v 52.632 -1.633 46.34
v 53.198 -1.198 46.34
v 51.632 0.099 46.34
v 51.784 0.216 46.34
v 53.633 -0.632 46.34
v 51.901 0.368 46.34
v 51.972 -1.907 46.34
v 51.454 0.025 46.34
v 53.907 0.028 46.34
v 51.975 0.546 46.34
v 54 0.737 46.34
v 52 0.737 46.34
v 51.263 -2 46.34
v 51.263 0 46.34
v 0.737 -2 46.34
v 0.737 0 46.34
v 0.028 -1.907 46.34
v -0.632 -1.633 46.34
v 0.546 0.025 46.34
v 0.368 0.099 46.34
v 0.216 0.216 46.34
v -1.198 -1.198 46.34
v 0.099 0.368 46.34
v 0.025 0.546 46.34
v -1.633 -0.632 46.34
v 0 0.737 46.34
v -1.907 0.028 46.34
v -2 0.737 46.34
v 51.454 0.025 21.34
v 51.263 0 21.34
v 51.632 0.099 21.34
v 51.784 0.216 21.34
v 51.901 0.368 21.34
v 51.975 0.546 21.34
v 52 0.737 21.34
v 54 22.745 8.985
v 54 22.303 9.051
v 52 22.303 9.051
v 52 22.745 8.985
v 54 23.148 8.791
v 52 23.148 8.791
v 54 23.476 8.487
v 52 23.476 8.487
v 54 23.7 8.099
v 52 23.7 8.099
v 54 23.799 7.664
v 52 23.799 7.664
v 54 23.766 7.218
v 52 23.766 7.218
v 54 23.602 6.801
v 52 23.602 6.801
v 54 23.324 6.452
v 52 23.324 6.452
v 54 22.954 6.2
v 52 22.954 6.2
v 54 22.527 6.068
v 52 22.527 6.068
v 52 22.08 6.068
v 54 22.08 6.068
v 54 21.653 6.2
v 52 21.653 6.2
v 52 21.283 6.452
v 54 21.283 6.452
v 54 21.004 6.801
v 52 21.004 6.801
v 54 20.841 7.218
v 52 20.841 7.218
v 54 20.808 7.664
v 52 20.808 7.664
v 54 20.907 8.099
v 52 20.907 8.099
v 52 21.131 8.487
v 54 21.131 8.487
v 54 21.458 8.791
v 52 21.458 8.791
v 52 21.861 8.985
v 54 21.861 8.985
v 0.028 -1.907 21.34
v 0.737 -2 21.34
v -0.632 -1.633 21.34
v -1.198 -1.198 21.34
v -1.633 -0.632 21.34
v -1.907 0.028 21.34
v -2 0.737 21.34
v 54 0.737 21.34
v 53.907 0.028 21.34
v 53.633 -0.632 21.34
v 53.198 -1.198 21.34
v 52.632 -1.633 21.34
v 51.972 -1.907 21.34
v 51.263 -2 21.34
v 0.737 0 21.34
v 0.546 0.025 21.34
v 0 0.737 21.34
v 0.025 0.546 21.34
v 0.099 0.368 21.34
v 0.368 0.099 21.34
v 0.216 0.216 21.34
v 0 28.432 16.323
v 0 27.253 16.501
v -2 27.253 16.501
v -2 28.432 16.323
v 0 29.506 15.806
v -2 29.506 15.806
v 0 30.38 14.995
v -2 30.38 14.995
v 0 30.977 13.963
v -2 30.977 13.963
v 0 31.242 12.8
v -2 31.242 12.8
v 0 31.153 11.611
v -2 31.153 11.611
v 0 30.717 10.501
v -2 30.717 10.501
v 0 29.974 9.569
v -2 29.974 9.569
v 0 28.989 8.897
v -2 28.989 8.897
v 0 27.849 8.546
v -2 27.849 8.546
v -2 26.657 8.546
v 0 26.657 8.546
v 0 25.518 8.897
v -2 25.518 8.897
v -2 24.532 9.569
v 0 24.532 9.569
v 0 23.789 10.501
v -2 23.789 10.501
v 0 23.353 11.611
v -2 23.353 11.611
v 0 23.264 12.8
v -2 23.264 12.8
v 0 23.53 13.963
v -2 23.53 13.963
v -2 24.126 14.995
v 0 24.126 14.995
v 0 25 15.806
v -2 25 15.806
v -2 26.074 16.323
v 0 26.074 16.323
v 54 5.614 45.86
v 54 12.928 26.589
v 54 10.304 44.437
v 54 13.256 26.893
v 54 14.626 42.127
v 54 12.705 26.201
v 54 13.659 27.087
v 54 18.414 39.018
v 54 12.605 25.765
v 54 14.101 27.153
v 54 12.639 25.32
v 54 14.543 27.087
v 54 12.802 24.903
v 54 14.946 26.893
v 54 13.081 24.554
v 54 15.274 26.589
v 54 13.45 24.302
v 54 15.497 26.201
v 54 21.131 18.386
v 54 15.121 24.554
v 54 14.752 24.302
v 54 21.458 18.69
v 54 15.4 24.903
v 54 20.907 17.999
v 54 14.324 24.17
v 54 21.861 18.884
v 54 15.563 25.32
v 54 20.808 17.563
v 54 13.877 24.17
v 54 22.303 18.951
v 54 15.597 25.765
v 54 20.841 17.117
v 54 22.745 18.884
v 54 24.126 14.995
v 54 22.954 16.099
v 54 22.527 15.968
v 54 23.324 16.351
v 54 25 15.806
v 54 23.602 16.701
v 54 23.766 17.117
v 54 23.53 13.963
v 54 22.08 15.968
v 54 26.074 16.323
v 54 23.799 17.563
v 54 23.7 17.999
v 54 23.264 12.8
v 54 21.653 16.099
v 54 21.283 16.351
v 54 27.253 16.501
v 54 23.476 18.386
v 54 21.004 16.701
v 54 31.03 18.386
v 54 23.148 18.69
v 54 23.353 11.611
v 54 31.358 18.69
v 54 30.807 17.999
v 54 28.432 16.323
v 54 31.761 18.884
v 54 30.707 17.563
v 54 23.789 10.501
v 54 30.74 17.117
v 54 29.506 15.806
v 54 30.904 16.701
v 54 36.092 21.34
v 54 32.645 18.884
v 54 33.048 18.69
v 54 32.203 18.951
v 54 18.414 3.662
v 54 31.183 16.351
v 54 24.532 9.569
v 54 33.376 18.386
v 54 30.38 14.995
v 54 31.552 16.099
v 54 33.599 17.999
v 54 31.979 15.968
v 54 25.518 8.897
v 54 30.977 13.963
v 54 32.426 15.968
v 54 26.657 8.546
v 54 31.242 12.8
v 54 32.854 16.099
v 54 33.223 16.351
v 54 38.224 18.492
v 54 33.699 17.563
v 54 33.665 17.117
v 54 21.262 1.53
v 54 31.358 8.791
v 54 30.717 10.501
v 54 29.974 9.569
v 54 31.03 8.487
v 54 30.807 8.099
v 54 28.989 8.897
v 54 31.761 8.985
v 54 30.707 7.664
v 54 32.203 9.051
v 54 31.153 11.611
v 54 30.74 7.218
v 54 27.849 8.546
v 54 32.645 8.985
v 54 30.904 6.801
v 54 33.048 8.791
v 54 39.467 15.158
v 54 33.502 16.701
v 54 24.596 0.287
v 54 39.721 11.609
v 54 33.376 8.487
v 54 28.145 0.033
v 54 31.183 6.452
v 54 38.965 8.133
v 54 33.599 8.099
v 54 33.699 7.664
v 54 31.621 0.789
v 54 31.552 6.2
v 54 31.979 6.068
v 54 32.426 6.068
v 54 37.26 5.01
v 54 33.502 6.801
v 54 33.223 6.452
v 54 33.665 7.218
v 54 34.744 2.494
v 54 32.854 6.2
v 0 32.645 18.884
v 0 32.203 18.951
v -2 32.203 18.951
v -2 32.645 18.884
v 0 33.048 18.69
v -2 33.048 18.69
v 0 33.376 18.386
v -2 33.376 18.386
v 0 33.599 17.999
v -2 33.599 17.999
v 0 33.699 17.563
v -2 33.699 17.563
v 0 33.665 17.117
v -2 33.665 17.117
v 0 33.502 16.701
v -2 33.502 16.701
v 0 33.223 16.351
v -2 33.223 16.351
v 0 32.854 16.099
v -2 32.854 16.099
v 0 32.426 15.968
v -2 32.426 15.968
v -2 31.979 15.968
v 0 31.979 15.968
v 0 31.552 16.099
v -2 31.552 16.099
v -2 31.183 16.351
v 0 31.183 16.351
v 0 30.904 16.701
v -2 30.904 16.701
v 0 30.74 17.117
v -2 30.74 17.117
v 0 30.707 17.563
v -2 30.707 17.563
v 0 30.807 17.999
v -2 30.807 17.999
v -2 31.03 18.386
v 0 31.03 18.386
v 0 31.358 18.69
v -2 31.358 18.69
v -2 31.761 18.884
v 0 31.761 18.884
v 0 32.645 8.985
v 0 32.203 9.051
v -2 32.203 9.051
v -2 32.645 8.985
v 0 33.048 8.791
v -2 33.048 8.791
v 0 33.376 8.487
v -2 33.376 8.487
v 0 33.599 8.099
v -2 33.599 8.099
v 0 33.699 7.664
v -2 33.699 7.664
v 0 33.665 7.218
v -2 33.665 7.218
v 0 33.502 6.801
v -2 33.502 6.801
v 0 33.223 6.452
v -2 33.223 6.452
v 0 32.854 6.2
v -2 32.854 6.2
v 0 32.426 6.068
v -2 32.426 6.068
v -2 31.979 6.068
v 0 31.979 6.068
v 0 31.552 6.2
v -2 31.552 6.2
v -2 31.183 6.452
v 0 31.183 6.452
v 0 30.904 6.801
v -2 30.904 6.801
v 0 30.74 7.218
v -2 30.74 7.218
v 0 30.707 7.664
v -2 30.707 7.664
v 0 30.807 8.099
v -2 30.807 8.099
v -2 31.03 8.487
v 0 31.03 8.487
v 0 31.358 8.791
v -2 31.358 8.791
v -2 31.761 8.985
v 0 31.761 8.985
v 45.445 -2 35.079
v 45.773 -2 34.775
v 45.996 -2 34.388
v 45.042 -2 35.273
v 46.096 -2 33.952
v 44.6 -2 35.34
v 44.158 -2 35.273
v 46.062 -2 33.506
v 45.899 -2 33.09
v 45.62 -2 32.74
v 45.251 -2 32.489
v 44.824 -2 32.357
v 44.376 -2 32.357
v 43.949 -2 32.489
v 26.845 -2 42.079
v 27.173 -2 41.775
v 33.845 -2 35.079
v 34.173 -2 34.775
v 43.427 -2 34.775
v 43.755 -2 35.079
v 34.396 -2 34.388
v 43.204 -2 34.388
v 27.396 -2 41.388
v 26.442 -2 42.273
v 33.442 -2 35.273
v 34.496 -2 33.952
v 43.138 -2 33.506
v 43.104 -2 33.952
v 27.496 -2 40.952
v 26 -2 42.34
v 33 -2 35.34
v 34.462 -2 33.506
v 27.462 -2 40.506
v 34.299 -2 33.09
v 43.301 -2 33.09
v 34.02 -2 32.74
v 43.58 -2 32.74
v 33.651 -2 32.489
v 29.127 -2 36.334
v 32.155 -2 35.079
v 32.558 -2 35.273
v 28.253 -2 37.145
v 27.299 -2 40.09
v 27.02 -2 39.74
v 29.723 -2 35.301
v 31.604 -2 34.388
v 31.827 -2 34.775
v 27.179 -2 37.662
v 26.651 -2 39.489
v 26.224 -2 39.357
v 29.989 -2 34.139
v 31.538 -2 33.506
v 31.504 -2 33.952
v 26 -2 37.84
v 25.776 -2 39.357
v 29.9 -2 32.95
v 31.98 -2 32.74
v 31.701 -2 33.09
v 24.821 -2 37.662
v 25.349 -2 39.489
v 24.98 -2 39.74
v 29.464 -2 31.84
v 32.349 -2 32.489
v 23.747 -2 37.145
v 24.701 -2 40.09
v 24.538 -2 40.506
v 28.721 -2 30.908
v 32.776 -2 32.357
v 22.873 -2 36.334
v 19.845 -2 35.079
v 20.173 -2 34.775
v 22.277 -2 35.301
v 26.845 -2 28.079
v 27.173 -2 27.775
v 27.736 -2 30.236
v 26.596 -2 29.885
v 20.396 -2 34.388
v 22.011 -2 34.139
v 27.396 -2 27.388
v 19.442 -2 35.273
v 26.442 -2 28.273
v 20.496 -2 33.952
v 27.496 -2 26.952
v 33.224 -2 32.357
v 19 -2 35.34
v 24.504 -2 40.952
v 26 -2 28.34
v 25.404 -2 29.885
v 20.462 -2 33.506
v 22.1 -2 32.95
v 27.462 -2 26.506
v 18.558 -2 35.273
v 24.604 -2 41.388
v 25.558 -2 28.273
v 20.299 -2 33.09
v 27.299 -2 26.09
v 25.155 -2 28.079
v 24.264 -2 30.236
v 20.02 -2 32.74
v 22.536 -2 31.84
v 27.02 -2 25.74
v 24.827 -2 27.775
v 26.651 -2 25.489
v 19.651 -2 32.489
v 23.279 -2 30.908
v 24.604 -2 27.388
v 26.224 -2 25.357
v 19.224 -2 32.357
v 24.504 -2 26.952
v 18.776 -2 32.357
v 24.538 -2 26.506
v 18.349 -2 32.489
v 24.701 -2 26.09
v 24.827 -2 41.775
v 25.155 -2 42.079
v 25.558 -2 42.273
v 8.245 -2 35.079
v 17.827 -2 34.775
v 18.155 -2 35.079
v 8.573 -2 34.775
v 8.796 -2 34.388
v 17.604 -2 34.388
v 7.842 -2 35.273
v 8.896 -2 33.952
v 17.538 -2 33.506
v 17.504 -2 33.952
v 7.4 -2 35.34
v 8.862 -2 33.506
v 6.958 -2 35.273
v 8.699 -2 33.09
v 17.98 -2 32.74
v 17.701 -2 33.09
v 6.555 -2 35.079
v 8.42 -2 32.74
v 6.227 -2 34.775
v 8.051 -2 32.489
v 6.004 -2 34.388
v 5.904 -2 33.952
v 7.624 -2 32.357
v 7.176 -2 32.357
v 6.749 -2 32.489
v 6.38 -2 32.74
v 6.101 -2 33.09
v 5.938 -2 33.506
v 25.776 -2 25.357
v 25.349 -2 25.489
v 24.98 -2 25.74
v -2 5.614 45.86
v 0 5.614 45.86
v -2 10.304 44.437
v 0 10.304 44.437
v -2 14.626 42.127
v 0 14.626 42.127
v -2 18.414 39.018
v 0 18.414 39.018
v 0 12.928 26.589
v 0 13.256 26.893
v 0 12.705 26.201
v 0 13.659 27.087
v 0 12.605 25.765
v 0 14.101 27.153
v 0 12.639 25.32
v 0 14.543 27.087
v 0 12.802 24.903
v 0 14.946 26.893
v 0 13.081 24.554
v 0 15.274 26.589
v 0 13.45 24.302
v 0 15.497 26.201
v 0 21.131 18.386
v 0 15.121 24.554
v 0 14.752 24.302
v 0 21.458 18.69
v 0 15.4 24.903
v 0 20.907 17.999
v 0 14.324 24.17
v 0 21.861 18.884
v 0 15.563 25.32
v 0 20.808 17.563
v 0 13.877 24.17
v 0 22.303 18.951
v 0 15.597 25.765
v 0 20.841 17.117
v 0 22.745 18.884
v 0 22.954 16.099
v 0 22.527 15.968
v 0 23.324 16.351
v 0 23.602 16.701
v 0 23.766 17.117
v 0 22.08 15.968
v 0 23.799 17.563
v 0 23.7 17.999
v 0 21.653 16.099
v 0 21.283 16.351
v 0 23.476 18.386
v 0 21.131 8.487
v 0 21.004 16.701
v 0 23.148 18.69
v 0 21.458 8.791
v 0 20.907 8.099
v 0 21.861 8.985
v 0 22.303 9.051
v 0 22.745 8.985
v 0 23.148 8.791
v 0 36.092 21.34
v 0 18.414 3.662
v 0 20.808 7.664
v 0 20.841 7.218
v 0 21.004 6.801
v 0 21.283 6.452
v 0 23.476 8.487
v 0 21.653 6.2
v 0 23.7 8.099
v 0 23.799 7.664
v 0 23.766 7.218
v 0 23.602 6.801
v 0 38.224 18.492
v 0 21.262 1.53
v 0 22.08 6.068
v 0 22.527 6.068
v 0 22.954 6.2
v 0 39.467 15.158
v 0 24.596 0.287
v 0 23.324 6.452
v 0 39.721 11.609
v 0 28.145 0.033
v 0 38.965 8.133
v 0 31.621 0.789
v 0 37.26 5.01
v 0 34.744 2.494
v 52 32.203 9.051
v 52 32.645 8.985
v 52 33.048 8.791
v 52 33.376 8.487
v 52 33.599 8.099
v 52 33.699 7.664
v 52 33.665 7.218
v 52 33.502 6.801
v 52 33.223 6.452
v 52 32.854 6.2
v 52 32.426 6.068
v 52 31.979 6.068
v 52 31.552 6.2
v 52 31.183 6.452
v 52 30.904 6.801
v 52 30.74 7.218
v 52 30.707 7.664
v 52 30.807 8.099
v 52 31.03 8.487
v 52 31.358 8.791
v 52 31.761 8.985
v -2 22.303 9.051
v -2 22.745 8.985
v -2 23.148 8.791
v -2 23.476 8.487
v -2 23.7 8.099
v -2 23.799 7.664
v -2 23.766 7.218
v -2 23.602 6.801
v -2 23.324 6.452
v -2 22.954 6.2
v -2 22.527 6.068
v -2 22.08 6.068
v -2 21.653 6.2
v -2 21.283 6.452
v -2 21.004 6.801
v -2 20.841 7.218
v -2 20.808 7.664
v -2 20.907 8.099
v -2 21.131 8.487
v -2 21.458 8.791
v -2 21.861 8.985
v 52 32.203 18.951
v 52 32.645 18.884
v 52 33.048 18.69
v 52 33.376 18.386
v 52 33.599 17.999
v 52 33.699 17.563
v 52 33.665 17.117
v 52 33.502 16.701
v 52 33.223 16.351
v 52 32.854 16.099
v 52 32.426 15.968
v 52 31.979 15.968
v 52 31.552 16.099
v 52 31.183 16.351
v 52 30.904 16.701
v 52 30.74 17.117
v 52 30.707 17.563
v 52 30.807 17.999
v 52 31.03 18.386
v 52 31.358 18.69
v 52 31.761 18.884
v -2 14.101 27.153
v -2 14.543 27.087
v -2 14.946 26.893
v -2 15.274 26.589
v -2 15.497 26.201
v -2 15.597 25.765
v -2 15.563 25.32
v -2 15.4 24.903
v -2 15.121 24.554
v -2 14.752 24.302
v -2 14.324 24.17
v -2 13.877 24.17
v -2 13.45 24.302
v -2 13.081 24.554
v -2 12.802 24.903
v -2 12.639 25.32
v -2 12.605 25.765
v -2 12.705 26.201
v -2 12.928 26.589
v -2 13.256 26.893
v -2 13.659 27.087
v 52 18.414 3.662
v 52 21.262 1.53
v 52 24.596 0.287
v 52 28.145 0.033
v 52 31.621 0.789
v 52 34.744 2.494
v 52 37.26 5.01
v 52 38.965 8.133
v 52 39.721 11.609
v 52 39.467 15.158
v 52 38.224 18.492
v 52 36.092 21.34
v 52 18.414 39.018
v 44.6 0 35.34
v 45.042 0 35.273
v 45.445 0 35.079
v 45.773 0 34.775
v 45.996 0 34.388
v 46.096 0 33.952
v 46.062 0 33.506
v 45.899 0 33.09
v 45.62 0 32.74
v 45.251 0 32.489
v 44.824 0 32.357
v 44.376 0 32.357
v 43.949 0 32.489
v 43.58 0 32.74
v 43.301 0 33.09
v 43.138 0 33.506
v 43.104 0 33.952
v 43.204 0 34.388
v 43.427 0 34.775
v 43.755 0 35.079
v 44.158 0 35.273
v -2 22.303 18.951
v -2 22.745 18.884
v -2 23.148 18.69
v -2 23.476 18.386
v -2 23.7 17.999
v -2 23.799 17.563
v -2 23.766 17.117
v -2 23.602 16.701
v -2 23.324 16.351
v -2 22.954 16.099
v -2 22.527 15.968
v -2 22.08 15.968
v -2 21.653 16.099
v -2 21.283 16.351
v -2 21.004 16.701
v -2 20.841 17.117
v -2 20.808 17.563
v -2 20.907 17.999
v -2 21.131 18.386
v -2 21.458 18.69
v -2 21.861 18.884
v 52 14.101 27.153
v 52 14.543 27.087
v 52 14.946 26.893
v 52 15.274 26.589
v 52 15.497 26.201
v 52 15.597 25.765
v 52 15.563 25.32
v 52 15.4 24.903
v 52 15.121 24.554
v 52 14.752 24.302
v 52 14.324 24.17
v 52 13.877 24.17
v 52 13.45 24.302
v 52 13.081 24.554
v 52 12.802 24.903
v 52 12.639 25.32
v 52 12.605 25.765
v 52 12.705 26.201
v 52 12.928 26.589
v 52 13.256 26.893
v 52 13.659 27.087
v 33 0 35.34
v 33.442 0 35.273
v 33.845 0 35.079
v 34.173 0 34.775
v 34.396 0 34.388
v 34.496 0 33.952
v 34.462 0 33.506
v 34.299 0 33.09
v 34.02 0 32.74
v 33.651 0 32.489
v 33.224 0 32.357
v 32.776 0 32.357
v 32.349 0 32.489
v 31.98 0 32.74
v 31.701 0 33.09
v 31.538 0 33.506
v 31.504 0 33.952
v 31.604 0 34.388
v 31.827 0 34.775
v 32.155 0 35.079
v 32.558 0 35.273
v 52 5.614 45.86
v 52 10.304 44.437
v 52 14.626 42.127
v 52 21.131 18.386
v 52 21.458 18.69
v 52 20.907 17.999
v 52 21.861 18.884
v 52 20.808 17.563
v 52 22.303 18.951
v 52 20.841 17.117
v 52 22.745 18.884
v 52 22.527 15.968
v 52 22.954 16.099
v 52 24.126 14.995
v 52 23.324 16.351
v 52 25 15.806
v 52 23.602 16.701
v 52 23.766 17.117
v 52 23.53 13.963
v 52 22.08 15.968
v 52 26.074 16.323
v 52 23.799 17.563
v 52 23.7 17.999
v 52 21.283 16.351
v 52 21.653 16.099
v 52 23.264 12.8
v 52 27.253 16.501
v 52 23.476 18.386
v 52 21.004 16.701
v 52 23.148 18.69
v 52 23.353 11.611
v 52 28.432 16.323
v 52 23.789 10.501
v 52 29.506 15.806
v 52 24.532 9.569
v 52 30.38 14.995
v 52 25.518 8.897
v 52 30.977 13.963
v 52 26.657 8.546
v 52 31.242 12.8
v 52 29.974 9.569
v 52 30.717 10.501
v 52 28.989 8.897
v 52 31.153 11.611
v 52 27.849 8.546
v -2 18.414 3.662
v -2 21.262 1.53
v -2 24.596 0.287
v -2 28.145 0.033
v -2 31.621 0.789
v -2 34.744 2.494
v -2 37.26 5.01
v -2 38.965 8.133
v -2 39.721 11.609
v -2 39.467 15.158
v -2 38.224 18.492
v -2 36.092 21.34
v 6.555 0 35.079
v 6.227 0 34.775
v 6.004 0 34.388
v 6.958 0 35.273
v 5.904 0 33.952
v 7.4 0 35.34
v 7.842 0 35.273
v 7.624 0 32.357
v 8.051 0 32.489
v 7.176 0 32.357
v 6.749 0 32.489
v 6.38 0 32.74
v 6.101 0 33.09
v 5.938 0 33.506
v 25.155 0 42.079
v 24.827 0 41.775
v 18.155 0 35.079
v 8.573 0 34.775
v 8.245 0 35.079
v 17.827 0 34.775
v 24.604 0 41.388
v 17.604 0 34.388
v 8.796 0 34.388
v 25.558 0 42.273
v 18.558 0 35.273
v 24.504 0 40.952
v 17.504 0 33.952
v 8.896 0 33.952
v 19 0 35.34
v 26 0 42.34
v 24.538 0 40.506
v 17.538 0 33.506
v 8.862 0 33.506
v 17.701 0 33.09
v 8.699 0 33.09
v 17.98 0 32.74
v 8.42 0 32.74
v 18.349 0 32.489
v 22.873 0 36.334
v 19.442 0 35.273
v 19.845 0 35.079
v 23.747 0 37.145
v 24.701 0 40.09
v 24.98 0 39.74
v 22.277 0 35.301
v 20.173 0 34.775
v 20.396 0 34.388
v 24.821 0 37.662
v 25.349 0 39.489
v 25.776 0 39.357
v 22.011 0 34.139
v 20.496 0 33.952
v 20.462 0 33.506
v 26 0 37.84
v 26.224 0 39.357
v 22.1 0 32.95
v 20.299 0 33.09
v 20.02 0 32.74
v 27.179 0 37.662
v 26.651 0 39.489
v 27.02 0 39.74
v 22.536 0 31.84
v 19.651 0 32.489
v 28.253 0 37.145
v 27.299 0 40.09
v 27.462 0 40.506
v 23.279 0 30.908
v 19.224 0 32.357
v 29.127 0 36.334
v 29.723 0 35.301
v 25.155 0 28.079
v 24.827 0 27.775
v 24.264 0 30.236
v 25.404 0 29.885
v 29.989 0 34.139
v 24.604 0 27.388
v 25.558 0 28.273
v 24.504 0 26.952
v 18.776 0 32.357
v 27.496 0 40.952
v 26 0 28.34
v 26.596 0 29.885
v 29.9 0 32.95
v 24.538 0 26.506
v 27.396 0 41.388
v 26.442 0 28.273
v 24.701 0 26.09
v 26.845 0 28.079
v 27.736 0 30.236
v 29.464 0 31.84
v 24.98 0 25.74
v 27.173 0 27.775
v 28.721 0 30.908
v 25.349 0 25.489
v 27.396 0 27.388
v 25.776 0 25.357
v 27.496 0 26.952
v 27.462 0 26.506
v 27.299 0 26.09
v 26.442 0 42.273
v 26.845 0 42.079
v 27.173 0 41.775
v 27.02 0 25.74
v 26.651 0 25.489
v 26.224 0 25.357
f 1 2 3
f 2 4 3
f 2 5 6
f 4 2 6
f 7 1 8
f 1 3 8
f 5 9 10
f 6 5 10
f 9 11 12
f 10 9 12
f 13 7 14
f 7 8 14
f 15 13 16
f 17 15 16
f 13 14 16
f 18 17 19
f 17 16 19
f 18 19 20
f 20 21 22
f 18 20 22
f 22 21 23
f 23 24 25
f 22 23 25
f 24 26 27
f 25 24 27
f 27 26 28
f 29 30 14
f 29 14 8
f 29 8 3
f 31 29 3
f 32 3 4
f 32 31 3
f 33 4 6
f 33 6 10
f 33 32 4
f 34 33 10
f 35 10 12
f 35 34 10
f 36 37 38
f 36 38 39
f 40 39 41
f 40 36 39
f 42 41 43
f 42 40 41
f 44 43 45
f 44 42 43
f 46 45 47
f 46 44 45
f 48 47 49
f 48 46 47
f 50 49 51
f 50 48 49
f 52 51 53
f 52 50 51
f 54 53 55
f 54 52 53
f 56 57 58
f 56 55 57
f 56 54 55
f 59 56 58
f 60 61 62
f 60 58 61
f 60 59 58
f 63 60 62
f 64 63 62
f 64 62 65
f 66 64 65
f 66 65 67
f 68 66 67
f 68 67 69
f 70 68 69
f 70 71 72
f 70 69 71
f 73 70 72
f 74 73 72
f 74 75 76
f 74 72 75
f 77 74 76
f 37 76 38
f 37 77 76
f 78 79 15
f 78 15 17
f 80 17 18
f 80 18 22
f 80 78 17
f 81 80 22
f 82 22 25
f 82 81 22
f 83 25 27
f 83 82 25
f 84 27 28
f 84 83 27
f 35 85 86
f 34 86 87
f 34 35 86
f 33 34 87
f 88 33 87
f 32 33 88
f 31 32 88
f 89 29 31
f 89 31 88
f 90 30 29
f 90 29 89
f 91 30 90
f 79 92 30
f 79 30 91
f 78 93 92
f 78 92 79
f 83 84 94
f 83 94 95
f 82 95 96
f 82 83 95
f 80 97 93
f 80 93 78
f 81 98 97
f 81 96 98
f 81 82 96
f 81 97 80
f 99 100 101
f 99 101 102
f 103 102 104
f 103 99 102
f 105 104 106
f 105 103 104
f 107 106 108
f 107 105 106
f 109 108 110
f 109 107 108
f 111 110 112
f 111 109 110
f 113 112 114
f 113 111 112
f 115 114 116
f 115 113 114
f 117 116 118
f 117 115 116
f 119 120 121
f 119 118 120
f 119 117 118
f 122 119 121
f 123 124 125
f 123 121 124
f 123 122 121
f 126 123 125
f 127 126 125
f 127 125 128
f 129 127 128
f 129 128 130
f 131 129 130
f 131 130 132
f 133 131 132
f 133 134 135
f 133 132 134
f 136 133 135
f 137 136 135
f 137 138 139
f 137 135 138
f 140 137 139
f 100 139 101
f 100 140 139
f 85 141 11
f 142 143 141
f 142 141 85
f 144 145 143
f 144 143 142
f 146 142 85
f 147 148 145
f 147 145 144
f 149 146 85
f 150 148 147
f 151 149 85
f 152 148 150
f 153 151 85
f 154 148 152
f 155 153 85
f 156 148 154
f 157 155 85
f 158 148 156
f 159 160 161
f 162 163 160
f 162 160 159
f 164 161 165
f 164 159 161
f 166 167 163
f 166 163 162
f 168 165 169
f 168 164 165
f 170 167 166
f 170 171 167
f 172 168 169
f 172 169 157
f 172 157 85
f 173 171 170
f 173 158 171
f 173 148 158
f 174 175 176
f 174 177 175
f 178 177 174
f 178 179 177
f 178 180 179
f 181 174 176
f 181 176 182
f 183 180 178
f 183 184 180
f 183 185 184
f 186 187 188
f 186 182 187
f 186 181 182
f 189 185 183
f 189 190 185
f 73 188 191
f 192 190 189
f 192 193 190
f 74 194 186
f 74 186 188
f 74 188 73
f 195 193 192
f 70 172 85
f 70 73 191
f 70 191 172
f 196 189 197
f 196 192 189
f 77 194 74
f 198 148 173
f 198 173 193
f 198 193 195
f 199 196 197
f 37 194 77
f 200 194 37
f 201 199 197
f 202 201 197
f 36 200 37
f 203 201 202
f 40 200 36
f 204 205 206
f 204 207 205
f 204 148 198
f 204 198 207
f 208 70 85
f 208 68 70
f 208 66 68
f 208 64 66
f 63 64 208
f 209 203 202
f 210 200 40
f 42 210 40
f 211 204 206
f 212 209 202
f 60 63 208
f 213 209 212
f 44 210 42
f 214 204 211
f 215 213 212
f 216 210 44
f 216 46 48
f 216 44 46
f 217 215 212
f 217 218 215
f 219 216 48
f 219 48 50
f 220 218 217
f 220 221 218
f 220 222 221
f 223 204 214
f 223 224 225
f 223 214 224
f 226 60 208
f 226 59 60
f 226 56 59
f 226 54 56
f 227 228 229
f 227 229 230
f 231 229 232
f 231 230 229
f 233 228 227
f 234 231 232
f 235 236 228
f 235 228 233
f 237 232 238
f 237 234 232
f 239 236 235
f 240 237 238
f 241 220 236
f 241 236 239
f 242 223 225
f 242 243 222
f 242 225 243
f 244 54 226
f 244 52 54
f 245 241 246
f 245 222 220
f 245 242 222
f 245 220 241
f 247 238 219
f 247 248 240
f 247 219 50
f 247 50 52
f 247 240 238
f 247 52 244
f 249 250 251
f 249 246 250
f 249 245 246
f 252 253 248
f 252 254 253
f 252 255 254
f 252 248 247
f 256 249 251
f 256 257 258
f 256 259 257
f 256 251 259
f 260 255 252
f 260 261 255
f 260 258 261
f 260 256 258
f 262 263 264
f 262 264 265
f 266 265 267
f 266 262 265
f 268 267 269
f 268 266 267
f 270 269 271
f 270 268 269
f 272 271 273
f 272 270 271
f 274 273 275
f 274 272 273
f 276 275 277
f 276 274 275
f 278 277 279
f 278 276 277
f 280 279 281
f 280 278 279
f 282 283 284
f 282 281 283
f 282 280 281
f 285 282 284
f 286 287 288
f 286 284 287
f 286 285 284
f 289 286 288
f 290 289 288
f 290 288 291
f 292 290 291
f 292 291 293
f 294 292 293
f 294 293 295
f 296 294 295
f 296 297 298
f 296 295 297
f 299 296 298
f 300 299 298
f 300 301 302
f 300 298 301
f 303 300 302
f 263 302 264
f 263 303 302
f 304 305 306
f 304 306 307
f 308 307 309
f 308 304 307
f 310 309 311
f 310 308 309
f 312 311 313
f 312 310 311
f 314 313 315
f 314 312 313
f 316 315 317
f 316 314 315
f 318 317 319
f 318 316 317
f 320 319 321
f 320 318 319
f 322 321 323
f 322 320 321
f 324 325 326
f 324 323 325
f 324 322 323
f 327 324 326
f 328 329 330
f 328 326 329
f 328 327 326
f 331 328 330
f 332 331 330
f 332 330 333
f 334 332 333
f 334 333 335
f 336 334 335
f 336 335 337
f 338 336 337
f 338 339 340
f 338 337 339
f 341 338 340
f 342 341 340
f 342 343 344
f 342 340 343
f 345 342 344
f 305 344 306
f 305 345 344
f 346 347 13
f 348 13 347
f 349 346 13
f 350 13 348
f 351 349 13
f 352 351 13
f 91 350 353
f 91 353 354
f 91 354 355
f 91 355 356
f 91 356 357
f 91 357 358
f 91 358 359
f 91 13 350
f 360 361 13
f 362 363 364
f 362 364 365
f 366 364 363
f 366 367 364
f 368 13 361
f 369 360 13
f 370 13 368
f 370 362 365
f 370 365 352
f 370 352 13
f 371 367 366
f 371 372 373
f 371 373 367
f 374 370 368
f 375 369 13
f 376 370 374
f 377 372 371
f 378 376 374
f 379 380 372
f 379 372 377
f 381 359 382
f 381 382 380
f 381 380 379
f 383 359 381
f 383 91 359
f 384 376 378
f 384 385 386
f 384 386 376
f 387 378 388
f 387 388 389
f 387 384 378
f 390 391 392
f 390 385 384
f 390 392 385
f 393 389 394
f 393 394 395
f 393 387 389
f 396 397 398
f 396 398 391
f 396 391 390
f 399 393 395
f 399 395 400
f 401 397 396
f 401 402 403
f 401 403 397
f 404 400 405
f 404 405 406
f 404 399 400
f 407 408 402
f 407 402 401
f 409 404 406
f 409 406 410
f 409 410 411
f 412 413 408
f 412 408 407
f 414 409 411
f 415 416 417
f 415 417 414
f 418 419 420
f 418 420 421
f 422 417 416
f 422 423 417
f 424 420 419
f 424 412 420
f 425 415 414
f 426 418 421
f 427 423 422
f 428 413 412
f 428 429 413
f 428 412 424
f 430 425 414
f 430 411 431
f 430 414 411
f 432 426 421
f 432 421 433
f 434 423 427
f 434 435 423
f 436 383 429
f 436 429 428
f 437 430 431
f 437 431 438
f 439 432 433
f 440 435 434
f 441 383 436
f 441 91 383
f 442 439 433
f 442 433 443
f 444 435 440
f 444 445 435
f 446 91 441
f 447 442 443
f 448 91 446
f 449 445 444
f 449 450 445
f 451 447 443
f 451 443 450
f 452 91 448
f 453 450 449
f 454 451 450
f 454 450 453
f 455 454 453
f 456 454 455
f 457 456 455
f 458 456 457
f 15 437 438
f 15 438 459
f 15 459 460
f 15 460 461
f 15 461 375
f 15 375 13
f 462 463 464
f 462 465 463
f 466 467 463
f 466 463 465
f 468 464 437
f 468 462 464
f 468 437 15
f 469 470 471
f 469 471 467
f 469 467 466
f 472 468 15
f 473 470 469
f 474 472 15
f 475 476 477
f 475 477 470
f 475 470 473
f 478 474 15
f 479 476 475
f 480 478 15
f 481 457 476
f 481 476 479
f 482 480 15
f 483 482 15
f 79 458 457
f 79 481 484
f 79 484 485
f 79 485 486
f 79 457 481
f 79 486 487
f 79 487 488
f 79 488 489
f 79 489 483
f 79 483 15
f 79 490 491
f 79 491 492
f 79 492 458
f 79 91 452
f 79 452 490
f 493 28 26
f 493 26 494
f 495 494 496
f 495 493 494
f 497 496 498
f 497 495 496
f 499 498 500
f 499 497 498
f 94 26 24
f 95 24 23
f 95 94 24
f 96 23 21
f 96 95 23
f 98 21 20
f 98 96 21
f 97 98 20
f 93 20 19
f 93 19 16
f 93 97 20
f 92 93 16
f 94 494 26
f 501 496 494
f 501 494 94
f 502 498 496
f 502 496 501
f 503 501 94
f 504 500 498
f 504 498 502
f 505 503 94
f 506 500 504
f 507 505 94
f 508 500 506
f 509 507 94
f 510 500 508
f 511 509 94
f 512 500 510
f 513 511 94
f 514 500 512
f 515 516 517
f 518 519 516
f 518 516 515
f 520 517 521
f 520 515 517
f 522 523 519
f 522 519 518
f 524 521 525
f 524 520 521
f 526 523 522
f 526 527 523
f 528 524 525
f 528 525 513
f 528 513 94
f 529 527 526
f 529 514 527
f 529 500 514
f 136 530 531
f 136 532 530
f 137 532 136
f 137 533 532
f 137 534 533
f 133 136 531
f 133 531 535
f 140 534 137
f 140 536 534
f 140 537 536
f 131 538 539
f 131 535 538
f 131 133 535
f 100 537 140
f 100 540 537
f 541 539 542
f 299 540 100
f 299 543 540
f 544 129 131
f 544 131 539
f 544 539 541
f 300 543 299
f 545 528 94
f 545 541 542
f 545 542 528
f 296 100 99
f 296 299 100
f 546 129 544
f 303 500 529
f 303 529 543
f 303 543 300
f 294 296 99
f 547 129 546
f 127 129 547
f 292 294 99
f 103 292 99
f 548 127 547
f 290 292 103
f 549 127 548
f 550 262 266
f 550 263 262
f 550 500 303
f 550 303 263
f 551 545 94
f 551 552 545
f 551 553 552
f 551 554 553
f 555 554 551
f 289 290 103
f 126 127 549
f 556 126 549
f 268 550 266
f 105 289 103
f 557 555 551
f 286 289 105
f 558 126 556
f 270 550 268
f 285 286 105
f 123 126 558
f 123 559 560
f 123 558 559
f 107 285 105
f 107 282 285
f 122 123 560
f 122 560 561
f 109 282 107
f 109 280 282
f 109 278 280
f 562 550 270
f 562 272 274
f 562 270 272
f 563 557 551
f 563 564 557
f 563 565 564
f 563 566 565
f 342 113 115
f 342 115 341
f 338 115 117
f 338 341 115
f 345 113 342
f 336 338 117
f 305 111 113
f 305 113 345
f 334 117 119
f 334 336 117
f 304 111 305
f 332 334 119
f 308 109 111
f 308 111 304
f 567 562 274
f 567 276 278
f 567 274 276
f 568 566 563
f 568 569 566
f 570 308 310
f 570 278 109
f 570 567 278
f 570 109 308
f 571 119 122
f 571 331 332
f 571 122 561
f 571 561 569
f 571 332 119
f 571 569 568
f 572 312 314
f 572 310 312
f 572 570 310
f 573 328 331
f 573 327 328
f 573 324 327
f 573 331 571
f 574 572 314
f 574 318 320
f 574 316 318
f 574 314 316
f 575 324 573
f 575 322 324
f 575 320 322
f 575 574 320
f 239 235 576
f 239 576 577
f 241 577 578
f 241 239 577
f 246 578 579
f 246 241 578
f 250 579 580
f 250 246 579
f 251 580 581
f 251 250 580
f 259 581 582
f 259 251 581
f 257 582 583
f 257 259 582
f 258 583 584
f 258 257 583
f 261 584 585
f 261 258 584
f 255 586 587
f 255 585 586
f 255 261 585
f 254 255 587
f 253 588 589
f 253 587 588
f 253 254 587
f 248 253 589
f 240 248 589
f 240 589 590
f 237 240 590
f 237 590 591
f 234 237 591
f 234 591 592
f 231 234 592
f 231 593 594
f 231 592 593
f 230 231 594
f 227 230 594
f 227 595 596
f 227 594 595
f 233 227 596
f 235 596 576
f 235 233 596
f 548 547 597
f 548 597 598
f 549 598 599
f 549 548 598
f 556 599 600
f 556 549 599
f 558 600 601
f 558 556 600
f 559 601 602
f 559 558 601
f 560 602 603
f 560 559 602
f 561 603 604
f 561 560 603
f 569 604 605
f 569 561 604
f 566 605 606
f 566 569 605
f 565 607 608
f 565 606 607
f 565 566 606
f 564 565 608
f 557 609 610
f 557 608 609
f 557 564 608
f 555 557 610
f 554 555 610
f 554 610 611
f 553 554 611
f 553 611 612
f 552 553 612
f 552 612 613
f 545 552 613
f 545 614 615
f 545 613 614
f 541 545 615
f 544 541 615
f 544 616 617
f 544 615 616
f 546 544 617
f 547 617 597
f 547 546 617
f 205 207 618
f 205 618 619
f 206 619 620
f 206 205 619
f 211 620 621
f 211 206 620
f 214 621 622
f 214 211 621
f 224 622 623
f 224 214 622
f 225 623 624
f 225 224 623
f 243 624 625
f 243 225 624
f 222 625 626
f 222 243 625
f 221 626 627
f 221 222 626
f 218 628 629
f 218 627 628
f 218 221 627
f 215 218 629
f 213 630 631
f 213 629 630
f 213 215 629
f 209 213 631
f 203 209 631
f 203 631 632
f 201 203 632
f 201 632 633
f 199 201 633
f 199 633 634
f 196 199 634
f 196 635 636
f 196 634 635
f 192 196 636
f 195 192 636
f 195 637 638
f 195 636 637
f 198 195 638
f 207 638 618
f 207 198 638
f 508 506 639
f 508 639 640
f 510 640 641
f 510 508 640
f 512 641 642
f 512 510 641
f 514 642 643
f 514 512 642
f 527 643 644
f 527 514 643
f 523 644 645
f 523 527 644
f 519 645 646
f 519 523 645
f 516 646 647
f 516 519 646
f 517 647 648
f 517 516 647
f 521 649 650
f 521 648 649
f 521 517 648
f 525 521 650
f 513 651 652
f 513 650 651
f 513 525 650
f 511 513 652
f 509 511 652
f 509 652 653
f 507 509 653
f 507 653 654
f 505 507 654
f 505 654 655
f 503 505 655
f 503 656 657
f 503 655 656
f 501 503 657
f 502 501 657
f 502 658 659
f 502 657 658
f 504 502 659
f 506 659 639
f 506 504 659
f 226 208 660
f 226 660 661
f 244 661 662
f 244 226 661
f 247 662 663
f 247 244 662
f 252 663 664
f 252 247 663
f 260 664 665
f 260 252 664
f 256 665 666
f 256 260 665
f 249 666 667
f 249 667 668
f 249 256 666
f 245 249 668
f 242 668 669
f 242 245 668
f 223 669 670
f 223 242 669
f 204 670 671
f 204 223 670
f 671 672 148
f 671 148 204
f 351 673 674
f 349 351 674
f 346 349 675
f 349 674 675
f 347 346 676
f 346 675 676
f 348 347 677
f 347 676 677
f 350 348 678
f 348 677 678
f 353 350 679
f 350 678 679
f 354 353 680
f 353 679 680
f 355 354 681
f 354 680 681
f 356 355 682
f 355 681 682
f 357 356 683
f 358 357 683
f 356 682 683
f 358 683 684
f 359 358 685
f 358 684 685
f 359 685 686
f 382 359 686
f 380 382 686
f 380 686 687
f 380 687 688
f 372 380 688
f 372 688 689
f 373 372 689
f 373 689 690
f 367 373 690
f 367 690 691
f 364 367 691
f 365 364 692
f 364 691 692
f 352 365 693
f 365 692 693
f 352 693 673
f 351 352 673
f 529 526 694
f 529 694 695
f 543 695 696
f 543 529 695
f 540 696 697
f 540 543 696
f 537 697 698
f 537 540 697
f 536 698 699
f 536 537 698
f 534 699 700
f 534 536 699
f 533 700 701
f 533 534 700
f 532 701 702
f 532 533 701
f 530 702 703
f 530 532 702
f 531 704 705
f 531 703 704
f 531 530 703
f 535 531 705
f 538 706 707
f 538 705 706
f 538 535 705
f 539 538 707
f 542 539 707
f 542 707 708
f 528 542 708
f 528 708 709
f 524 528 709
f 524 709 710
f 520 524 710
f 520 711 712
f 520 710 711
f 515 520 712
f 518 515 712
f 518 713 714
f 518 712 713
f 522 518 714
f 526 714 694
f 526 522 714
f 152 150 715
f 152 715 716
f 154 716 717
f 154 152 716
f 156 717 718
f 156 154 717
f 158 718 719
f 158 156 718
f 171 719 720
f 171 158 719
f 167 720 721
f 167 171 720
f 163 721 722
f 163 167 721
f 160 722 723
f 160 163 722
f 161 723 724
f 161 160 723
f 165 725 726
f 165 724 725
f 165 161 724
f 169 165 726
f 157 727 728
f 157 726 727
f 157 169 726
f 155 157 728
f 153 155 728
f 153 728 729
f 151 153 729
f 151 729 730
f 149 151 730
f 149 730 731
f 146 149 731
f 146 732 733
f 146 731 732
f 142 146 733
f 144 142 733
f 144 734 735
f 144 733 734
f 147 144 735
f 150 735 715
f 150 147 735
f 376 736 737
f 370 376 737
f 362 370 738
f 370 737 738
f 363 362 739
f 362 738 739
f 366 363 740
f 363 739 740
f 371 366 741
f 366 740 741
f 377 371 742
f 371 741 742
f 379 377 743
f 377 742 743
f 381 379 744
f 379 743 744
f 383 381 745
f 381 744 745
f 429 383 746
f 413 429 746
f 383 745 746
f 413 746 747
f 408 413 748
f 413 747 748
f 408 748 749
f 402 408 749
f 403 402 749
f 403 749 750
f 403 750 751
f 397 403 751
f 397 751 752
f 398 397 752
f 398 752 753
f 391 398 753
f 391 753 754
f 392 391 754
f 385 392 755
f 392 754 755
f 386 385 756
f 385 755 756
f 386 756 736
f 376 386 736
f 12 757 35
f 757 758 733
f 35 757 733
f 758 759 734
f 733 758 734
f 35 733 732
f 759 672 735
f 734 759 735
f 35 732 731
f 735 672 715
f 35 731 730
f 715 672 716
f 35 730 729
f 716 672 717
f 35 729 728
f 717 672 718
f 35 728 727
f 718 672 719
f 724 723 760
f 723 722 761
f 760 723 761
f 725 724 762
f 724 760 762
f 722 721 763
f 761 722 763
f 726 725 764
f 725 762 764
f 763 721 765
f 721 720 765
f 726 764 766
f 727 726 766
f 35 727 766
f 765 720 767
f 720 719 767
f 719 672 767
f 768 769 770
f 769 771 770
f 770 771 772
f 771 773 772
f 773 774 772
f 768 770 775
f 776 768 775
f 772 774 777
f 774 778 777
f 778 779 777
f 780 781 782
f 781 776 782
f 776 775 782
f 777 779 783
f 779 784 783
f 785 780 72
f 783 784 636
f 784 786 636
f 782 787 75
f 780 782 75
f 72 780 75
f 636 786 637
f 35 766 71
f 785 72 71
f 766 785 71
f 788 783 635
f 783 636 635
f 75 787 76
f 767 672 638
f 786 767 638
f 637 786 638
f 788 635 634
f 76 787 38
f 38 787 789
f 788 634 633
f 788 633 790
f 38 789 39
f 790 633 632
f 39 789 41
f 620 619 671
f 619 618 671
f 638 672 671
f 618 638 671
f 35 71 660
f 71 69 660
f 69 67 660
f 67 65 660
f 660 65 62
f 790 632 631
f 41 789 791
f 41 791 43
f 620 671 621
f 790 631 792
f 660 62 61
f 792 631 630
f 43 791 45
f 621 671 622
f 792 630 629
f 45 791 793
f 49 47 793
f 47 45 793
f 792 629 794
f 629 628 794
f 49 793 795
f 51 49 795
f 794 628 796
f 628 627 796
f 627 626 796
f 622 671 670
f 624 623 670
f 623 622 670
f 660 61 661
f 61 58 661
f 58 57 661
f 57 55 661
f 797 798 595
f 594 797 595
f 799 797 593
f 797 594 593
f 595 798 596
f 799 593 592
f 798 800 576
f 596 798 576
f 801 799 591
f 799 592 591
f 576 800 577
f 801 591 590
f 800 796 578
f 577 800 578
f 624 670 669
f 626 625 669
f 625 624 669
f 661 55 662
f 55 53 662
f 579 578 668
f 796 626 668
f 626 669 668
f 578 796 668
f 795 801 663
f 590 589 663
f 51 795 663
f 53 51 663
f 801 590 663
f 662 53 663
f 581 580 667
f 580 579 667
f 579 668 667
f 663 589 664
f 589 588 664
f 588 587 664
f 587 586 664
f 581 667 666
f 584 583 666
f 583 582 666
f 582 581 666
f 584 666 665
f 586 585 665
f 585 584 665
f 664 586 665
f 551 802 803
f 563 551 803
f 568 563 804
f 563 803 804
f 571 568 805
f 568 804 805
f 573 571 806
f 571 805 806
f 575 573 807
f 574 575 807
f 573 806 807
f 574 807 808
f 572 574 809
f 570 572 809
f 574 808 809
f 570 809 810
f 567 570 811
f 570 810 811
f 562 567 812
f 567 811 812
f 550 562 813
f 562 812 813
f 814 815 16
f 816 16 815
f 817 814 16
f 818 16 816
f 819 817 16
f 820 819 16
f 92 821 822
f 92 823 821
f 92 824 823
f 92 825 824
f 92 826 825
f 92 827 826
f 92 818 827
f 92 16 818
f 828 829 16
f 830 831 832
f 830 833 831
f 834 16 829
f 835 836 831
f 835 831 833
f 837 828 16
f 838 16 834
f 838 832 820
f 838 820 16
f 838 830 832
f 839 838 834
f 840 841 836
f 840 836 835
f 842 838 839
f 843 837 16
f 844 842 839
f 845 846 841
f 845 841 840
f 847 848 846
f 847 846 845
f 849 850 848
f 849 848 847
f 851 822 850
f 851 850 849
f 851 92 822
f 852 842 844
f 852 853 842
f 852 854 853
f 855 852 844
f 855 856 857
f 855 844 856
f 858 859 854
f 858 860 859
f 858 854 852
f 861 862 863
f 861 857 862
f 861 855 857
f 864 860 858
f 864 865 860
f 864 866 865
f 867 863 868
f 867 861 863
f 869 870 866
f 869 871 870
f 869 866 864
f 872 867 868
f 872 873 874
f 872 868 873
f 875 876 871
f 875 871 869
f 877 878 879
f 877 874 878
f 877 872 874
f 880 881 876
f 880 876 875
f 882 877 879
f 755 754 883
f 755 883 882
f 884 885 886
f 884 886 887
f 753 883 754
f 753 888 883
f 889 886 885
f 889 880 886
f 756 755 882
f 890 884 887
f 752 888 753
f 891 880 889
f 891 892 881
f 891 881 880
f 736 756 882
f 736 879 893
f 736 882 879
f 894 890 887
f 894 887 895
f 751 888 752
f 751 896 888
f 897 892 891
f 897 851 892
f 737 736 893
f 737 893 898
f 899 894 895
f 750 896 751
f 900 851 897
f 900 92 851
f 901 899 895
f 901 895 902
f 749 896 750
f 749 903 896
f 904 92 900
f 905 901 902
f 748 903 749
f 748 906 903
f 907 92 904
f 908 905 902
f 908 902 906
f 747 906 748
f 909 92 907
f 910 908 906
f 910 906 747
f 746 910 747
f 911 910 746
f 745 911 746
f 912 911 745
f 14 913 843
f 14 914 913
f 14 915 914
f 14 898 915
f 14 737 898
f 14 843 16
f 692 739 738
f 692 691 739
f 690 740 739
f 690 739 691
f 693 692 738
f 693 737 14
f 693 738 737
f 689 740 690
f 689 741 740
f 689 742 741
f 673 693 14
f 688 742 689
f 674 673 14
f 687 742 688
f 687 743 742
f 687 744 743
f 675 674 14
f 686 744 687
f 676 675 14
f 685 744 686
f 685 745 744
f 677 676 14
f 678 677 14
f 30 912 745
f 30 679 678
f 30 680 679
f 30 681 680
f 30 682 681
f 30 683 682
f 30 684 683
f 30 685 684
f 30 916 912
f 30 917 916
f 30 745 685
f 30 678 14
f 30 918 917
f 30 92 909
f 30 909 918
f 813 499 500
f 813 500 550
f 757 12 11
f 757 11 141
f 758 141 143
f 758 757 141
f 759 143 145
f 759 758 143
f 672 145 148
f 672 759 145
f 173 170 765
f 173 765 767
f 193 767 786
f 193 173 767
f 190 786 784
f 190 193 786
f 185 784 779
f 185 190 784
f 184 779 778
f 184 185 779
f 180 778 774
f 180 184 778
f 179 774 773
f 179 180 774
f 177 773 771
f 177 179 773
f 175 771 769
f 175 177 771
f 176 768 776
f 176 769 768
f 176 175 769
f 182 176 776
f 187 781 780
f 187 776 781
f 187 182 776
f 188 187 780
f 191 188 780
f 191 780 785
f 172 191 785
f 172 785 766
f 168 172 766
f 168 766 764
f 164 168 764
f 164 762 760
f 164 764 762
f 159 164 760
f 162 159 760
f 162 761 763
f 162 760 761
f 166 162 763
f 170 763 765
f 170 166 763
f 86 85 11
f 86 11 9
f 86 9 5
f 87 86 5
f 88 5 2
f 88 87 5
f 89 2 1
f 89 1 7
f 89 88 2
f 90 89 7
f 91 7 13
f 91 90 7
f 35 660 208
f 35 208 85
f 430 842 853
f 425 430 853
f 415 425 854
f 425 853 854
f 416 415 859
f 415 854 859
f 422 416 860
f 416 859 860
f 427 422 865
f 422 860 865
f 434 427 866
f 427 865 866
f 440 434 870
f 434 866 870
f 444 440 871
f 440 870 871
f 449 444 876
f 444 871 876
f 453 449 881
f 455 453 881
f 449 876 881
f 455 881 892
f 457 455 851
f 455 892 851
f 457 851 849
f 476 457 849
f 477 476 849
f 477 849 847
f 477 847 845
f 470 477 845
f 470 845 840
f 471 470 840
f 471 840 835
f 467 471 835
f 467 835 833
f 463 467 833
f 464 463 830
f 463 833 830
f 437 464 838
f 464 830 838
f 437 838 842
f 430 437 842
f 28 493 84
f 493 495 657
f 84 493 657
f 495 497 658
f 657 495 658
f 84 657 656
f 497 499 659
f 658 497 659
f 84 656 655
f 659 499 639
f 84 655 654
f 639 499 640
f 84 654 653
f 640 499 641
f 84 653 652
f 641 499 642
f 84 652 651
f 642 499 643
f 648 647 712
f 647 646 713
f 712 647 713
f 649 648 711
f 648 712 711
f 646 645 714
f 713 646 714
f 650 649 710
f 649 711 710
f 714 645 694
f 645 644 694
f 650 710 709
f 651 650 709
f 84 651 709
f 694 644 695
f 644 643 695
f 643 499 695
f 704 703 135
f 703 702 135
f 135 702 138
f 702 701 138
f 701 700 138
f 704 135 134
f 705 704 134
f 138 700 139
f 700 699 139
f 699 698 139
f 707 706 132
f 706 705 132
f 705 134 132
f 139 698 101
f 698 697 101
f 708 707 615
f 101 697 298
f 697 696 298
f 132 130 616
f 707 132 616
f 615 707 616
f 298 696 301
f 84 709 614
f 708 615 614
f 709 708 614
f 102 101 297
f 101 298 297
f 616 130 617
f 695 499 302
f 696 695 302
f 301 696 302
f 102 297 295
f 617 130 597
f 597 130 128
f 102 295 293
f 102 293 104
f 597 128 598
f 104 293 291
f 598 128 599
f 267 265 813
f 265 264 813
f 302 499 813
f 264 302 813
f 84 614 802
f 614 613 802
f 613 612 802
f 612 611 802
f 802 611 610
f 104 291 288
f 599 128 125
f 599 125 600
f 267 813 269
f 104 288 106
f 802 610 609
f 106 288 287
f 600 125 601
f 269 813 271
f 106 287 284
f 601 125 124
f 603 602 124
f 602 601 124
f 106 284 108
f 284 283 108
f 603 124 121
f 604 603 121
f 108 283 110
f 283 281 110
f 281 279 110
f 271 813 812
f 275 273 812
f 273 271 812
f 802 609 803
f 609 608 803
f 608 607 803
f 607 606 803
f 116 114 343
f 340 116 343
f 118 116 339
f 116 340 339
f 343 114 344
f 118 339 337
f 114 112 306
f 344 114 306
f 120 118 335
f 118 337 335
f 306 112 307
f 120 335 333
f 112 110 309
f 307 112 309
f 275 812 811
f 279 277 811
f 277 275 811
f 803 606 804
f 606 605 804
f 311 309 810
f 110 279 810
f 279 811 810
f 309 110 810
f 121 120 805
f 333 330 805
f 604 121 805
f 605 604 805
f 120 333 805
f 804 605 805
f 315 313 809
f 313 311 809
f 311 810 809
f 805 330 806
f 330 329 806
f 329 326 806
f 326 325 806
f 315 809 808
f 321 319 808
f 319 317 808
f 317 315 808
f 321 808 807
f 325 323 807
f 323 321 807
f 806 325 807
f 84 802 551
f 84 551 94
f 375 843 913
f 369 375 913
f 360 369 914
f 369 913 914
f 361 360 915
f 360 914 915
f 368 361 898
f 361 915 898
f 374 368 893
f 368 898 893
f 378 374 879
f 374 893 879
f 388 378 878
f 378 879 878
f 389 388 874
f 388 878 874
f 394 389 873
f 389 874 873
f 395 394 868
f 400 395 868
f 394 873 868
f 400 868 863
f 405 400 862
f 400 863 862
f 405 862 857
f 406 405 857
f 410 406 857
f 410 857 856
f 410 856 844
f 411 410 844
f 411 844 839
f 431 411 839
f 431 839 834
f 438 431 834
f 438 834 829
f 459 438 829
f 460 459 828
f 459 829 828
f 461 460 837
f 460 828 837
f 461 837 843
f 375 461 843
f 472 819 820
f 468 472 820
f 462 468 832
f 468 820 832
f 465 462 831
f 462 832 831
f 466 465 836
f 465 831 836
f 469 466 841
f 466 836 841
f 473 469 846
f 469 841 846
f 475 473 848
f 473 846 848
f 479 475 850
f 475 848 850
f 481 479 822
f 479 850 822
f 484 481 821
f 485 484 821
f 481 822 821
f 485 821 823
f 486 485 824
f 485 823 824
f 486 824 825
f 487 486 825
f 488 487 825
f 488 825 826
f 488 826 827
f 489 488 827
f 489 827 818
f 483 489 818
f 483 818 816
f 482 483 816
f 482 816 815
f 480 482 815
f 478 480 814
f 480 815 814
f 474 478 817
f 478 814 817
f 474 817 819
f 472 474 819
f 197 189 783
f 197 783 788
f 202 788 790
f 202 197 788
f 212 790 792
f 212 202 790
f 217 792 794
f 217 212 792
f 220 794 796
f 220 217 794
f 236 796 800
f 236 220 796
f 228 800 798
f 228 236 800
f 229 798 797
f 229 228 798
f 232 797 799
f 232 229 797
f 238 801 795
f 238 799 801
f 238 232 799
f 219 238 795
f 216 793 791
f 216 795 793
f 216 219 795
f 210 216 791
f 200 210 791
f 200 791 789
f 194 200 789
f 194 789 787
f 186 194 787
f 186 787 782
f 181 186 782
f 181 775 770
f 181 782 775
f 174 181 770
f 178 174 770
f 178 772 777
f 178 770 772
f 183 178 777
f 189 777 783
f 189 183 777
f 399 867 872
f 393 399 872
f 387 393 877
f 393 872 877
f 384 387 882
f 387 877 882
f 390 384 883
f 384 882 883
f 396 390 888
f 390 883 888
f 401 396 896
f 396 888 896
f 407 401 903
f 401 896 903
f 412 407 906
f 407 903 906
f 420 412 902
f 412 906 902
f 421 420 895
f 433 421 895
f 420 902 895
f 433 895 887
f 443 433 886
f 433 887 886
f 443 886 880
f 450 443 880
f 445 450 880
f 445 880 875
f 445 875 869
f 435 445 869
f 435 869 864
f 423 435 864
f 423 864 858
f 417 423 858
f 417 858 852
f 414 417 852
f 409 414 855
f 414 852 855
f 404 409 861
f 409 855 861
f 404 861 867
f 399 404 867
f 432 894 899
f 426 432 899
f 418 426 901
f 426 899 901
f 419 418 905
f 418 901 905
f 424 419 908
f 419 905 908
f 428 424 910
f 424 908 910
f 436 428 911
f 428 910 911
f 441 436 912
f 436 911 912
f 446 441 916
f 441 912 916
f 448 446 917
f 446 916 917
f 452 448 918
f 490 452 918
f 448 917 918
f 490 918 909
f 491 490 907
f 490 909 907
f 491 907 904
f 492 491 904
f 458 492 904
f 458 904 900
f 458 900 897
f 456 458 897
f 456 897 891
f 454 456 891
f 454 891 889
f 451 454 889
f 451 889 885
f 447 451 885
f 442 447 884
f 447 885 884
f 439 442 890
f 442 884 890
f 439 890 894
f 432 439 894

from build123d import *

# Parameters (mm, degrees)
SM_BASE_FLANGE_1_DEPTH   = 46.34
CUT_EXTRUDE_1_DEPTH      = 83.488760446
EXTRUDE_1_DEPTH          = 2
CUT_EXTRUDE_2_DEPTH      = 82.508925285
CUT_EXTRUDE_2_DEPTH_BACK = 82.508925285
SKETCH_9_R               = 4
SKETCH_9_R_2             = 1.5
SKETCH_10_R              = 4
SKETCH_10_R_2            = 1.5
CUT_EXTRUDE_3_DEPTH      = 2


# Sheet-metal steps are written as plain solids
with BuildPart() as part:
    # Sketch 1 → 基体-法兰1 (new body)
    with BuildSketch(Plane.XY):
        with BuildLine():
            Line((0, 39), (0, 0.7366))
            ThreePointArc((0, 0.7366), (0.215745145, 0.215745145), (0.7366, 0))
            Line((0.7366, 0), (51.2634, 0))
            ThreePointArc((51.2634, 0), (51.784254855, 0.215745145), (52, 0.7366))
            Line((52, 0.7366), (52, 39))
            Line((52, 39), (54, 39))
            Line((54, 39), (54, 0.7366))
            ThreePointArc((54, 0.7366), (53.198468417, -1.198468417), (51.2634, -2))
            Line((51.2634, -2), (0.7366, -2))
            ThreePointArc((0.7366, -2), (-1.198468417, -1.198468417), (-2, 0.7366))
            Line((-2, 0.7366), (-2, 39))
            Line((-2, 39), (0, 39))
        make_face()
    extrude(amount=SM_BASE_FLANGE_1_DEPTH)

    # 草图7 → 切除-拉伸1 (cut, through all)
    with BuildSketch(Plane.ZY.offset(2)):
        with BuildLine():
            ThreePointArc((46.34, 0.7366), (44.436988313, 10.303685809), (39.01766953, 18.41426953))
            Line((39.01766953, 18.41426953), (21.34, 36.091939059))
            Line((21.34, 36.091939059), (3.66233047, 18.41426953))
            Line((3.66233047, 18.41426953), (21.34, 0.7366))
            Line((21.34, 0.7366), (21.34, -3.161495831))
            Line((21.34, -3.161495831), (-1.543022836, -3.161495831))
            Line((-1.543022836, -3.161495831), (-1.543022836, 48.54205915))
            Line((-1.543022836, 48.54205915), (49.658153452, 48.54205915))
            Line((49.658153452, 48.54205915), (49.658153452, 0.7366))
            Line((49.658153452, 0.7366), (46.34, 0.7366))
        make_face()
    extrude(amount=-CUT_EXTRUDE_1_DEPTH, mode=Mode.SUBTRACT)

    # 草图8 → 凸台-拉伸1 (add)
    with BuildSketch(Plane.ZY.offset(2)):
        with BuildLine():
            Line((21.34, 36.091939059), (3.66233047, 18.41426953))
            ThreePointArc((3.66233047, 18.41426953), (3.66233047, 36.091939059), (21.34, 36.091939059))
        make_face()
    extrude_1 = extrude(amount=-EXTRUDE_1_DEPTH)

    # 镜向1: 凸台-拉伸1 across plane
    add(extrude_1.mirror(Plane(origin=(26, 0, 0), x_dir=(0, 0, 1), z_dir=(1, 0, 0))))

    # 草图9 → 切除-拉伸2 (cut, two sides: drawn at the far end of the back side and taken through both)
    with BuildSketch(Plane.ZY.offset(-52).offset(-CUT_EXTRUDE_2_DEPTH_BACK)):
        with Locations((12.501165235, 27.253104294)):
            Circle(SKETCH_9_R)
        with Locations((25.653351365, 14.100918164)):
            Circle(SKETCH_9_R_2)
        with Locations((7.551417767, 32.202851763)):
            Circle(SKETCH_9_R_2)
        with Locations((17.450912703, 32.202851763)):
            Circle(SKETCH_9_R_2)
        with Locations((17.450912703, 22.303356826)):
            Circle(SKETCH_9_R_2)
        with Locations((7.551417767, 22.303356826)):
            Circle(SKETCH_9_R_2)
    extrude(amount=CUT_EXTRUDE_2_DEPTH + CUT_EXTRUDE_2_DEPTH_BACK, mode=Mode.SUBTRACT)

    # 草图10 → 切除-拉伸3 (cut)
    with BuildSketch(Plane(origin=(0, 0, 0), x_dir=(1, 0, 0), z_dir=(0, 1, 0))):
        with Locations(Location((26, -33.84, 0), (0, 0, 270))):
            Circle(SKETCH_10_R)
        with Locations(Location((26, -26.84, 0), (0, 0, 270))):
            Circle(SKETCH_10_R_2)
        with Locations(Location((33, -33.84, 0), (0, 0, 270))):
            Circle(SKETCH_10_R_2)
        with Locations(Location((26, -40.84, 0), (0, 0, 270))):
            Circle(SKETCH_10_R_2)
        with Locations(Location((19, -33.84, 0), (0, 0, 270))):
            Circle(SKETCH_10_R_2)
        with Locations(Location((7.4, -33.84, 0), (0, 0, 270))):
            Circle(SKETCH_10_R_2)
        with Locations(Location((44.6, -33.84, 0), (0, 0, 270))):
            Circle(SKETCH_10_R_2)
    extrude(amount=-CUT_EXTRUDE_3_DEPTH, mode=Mode.SUBTRACT)


solid = part.part
